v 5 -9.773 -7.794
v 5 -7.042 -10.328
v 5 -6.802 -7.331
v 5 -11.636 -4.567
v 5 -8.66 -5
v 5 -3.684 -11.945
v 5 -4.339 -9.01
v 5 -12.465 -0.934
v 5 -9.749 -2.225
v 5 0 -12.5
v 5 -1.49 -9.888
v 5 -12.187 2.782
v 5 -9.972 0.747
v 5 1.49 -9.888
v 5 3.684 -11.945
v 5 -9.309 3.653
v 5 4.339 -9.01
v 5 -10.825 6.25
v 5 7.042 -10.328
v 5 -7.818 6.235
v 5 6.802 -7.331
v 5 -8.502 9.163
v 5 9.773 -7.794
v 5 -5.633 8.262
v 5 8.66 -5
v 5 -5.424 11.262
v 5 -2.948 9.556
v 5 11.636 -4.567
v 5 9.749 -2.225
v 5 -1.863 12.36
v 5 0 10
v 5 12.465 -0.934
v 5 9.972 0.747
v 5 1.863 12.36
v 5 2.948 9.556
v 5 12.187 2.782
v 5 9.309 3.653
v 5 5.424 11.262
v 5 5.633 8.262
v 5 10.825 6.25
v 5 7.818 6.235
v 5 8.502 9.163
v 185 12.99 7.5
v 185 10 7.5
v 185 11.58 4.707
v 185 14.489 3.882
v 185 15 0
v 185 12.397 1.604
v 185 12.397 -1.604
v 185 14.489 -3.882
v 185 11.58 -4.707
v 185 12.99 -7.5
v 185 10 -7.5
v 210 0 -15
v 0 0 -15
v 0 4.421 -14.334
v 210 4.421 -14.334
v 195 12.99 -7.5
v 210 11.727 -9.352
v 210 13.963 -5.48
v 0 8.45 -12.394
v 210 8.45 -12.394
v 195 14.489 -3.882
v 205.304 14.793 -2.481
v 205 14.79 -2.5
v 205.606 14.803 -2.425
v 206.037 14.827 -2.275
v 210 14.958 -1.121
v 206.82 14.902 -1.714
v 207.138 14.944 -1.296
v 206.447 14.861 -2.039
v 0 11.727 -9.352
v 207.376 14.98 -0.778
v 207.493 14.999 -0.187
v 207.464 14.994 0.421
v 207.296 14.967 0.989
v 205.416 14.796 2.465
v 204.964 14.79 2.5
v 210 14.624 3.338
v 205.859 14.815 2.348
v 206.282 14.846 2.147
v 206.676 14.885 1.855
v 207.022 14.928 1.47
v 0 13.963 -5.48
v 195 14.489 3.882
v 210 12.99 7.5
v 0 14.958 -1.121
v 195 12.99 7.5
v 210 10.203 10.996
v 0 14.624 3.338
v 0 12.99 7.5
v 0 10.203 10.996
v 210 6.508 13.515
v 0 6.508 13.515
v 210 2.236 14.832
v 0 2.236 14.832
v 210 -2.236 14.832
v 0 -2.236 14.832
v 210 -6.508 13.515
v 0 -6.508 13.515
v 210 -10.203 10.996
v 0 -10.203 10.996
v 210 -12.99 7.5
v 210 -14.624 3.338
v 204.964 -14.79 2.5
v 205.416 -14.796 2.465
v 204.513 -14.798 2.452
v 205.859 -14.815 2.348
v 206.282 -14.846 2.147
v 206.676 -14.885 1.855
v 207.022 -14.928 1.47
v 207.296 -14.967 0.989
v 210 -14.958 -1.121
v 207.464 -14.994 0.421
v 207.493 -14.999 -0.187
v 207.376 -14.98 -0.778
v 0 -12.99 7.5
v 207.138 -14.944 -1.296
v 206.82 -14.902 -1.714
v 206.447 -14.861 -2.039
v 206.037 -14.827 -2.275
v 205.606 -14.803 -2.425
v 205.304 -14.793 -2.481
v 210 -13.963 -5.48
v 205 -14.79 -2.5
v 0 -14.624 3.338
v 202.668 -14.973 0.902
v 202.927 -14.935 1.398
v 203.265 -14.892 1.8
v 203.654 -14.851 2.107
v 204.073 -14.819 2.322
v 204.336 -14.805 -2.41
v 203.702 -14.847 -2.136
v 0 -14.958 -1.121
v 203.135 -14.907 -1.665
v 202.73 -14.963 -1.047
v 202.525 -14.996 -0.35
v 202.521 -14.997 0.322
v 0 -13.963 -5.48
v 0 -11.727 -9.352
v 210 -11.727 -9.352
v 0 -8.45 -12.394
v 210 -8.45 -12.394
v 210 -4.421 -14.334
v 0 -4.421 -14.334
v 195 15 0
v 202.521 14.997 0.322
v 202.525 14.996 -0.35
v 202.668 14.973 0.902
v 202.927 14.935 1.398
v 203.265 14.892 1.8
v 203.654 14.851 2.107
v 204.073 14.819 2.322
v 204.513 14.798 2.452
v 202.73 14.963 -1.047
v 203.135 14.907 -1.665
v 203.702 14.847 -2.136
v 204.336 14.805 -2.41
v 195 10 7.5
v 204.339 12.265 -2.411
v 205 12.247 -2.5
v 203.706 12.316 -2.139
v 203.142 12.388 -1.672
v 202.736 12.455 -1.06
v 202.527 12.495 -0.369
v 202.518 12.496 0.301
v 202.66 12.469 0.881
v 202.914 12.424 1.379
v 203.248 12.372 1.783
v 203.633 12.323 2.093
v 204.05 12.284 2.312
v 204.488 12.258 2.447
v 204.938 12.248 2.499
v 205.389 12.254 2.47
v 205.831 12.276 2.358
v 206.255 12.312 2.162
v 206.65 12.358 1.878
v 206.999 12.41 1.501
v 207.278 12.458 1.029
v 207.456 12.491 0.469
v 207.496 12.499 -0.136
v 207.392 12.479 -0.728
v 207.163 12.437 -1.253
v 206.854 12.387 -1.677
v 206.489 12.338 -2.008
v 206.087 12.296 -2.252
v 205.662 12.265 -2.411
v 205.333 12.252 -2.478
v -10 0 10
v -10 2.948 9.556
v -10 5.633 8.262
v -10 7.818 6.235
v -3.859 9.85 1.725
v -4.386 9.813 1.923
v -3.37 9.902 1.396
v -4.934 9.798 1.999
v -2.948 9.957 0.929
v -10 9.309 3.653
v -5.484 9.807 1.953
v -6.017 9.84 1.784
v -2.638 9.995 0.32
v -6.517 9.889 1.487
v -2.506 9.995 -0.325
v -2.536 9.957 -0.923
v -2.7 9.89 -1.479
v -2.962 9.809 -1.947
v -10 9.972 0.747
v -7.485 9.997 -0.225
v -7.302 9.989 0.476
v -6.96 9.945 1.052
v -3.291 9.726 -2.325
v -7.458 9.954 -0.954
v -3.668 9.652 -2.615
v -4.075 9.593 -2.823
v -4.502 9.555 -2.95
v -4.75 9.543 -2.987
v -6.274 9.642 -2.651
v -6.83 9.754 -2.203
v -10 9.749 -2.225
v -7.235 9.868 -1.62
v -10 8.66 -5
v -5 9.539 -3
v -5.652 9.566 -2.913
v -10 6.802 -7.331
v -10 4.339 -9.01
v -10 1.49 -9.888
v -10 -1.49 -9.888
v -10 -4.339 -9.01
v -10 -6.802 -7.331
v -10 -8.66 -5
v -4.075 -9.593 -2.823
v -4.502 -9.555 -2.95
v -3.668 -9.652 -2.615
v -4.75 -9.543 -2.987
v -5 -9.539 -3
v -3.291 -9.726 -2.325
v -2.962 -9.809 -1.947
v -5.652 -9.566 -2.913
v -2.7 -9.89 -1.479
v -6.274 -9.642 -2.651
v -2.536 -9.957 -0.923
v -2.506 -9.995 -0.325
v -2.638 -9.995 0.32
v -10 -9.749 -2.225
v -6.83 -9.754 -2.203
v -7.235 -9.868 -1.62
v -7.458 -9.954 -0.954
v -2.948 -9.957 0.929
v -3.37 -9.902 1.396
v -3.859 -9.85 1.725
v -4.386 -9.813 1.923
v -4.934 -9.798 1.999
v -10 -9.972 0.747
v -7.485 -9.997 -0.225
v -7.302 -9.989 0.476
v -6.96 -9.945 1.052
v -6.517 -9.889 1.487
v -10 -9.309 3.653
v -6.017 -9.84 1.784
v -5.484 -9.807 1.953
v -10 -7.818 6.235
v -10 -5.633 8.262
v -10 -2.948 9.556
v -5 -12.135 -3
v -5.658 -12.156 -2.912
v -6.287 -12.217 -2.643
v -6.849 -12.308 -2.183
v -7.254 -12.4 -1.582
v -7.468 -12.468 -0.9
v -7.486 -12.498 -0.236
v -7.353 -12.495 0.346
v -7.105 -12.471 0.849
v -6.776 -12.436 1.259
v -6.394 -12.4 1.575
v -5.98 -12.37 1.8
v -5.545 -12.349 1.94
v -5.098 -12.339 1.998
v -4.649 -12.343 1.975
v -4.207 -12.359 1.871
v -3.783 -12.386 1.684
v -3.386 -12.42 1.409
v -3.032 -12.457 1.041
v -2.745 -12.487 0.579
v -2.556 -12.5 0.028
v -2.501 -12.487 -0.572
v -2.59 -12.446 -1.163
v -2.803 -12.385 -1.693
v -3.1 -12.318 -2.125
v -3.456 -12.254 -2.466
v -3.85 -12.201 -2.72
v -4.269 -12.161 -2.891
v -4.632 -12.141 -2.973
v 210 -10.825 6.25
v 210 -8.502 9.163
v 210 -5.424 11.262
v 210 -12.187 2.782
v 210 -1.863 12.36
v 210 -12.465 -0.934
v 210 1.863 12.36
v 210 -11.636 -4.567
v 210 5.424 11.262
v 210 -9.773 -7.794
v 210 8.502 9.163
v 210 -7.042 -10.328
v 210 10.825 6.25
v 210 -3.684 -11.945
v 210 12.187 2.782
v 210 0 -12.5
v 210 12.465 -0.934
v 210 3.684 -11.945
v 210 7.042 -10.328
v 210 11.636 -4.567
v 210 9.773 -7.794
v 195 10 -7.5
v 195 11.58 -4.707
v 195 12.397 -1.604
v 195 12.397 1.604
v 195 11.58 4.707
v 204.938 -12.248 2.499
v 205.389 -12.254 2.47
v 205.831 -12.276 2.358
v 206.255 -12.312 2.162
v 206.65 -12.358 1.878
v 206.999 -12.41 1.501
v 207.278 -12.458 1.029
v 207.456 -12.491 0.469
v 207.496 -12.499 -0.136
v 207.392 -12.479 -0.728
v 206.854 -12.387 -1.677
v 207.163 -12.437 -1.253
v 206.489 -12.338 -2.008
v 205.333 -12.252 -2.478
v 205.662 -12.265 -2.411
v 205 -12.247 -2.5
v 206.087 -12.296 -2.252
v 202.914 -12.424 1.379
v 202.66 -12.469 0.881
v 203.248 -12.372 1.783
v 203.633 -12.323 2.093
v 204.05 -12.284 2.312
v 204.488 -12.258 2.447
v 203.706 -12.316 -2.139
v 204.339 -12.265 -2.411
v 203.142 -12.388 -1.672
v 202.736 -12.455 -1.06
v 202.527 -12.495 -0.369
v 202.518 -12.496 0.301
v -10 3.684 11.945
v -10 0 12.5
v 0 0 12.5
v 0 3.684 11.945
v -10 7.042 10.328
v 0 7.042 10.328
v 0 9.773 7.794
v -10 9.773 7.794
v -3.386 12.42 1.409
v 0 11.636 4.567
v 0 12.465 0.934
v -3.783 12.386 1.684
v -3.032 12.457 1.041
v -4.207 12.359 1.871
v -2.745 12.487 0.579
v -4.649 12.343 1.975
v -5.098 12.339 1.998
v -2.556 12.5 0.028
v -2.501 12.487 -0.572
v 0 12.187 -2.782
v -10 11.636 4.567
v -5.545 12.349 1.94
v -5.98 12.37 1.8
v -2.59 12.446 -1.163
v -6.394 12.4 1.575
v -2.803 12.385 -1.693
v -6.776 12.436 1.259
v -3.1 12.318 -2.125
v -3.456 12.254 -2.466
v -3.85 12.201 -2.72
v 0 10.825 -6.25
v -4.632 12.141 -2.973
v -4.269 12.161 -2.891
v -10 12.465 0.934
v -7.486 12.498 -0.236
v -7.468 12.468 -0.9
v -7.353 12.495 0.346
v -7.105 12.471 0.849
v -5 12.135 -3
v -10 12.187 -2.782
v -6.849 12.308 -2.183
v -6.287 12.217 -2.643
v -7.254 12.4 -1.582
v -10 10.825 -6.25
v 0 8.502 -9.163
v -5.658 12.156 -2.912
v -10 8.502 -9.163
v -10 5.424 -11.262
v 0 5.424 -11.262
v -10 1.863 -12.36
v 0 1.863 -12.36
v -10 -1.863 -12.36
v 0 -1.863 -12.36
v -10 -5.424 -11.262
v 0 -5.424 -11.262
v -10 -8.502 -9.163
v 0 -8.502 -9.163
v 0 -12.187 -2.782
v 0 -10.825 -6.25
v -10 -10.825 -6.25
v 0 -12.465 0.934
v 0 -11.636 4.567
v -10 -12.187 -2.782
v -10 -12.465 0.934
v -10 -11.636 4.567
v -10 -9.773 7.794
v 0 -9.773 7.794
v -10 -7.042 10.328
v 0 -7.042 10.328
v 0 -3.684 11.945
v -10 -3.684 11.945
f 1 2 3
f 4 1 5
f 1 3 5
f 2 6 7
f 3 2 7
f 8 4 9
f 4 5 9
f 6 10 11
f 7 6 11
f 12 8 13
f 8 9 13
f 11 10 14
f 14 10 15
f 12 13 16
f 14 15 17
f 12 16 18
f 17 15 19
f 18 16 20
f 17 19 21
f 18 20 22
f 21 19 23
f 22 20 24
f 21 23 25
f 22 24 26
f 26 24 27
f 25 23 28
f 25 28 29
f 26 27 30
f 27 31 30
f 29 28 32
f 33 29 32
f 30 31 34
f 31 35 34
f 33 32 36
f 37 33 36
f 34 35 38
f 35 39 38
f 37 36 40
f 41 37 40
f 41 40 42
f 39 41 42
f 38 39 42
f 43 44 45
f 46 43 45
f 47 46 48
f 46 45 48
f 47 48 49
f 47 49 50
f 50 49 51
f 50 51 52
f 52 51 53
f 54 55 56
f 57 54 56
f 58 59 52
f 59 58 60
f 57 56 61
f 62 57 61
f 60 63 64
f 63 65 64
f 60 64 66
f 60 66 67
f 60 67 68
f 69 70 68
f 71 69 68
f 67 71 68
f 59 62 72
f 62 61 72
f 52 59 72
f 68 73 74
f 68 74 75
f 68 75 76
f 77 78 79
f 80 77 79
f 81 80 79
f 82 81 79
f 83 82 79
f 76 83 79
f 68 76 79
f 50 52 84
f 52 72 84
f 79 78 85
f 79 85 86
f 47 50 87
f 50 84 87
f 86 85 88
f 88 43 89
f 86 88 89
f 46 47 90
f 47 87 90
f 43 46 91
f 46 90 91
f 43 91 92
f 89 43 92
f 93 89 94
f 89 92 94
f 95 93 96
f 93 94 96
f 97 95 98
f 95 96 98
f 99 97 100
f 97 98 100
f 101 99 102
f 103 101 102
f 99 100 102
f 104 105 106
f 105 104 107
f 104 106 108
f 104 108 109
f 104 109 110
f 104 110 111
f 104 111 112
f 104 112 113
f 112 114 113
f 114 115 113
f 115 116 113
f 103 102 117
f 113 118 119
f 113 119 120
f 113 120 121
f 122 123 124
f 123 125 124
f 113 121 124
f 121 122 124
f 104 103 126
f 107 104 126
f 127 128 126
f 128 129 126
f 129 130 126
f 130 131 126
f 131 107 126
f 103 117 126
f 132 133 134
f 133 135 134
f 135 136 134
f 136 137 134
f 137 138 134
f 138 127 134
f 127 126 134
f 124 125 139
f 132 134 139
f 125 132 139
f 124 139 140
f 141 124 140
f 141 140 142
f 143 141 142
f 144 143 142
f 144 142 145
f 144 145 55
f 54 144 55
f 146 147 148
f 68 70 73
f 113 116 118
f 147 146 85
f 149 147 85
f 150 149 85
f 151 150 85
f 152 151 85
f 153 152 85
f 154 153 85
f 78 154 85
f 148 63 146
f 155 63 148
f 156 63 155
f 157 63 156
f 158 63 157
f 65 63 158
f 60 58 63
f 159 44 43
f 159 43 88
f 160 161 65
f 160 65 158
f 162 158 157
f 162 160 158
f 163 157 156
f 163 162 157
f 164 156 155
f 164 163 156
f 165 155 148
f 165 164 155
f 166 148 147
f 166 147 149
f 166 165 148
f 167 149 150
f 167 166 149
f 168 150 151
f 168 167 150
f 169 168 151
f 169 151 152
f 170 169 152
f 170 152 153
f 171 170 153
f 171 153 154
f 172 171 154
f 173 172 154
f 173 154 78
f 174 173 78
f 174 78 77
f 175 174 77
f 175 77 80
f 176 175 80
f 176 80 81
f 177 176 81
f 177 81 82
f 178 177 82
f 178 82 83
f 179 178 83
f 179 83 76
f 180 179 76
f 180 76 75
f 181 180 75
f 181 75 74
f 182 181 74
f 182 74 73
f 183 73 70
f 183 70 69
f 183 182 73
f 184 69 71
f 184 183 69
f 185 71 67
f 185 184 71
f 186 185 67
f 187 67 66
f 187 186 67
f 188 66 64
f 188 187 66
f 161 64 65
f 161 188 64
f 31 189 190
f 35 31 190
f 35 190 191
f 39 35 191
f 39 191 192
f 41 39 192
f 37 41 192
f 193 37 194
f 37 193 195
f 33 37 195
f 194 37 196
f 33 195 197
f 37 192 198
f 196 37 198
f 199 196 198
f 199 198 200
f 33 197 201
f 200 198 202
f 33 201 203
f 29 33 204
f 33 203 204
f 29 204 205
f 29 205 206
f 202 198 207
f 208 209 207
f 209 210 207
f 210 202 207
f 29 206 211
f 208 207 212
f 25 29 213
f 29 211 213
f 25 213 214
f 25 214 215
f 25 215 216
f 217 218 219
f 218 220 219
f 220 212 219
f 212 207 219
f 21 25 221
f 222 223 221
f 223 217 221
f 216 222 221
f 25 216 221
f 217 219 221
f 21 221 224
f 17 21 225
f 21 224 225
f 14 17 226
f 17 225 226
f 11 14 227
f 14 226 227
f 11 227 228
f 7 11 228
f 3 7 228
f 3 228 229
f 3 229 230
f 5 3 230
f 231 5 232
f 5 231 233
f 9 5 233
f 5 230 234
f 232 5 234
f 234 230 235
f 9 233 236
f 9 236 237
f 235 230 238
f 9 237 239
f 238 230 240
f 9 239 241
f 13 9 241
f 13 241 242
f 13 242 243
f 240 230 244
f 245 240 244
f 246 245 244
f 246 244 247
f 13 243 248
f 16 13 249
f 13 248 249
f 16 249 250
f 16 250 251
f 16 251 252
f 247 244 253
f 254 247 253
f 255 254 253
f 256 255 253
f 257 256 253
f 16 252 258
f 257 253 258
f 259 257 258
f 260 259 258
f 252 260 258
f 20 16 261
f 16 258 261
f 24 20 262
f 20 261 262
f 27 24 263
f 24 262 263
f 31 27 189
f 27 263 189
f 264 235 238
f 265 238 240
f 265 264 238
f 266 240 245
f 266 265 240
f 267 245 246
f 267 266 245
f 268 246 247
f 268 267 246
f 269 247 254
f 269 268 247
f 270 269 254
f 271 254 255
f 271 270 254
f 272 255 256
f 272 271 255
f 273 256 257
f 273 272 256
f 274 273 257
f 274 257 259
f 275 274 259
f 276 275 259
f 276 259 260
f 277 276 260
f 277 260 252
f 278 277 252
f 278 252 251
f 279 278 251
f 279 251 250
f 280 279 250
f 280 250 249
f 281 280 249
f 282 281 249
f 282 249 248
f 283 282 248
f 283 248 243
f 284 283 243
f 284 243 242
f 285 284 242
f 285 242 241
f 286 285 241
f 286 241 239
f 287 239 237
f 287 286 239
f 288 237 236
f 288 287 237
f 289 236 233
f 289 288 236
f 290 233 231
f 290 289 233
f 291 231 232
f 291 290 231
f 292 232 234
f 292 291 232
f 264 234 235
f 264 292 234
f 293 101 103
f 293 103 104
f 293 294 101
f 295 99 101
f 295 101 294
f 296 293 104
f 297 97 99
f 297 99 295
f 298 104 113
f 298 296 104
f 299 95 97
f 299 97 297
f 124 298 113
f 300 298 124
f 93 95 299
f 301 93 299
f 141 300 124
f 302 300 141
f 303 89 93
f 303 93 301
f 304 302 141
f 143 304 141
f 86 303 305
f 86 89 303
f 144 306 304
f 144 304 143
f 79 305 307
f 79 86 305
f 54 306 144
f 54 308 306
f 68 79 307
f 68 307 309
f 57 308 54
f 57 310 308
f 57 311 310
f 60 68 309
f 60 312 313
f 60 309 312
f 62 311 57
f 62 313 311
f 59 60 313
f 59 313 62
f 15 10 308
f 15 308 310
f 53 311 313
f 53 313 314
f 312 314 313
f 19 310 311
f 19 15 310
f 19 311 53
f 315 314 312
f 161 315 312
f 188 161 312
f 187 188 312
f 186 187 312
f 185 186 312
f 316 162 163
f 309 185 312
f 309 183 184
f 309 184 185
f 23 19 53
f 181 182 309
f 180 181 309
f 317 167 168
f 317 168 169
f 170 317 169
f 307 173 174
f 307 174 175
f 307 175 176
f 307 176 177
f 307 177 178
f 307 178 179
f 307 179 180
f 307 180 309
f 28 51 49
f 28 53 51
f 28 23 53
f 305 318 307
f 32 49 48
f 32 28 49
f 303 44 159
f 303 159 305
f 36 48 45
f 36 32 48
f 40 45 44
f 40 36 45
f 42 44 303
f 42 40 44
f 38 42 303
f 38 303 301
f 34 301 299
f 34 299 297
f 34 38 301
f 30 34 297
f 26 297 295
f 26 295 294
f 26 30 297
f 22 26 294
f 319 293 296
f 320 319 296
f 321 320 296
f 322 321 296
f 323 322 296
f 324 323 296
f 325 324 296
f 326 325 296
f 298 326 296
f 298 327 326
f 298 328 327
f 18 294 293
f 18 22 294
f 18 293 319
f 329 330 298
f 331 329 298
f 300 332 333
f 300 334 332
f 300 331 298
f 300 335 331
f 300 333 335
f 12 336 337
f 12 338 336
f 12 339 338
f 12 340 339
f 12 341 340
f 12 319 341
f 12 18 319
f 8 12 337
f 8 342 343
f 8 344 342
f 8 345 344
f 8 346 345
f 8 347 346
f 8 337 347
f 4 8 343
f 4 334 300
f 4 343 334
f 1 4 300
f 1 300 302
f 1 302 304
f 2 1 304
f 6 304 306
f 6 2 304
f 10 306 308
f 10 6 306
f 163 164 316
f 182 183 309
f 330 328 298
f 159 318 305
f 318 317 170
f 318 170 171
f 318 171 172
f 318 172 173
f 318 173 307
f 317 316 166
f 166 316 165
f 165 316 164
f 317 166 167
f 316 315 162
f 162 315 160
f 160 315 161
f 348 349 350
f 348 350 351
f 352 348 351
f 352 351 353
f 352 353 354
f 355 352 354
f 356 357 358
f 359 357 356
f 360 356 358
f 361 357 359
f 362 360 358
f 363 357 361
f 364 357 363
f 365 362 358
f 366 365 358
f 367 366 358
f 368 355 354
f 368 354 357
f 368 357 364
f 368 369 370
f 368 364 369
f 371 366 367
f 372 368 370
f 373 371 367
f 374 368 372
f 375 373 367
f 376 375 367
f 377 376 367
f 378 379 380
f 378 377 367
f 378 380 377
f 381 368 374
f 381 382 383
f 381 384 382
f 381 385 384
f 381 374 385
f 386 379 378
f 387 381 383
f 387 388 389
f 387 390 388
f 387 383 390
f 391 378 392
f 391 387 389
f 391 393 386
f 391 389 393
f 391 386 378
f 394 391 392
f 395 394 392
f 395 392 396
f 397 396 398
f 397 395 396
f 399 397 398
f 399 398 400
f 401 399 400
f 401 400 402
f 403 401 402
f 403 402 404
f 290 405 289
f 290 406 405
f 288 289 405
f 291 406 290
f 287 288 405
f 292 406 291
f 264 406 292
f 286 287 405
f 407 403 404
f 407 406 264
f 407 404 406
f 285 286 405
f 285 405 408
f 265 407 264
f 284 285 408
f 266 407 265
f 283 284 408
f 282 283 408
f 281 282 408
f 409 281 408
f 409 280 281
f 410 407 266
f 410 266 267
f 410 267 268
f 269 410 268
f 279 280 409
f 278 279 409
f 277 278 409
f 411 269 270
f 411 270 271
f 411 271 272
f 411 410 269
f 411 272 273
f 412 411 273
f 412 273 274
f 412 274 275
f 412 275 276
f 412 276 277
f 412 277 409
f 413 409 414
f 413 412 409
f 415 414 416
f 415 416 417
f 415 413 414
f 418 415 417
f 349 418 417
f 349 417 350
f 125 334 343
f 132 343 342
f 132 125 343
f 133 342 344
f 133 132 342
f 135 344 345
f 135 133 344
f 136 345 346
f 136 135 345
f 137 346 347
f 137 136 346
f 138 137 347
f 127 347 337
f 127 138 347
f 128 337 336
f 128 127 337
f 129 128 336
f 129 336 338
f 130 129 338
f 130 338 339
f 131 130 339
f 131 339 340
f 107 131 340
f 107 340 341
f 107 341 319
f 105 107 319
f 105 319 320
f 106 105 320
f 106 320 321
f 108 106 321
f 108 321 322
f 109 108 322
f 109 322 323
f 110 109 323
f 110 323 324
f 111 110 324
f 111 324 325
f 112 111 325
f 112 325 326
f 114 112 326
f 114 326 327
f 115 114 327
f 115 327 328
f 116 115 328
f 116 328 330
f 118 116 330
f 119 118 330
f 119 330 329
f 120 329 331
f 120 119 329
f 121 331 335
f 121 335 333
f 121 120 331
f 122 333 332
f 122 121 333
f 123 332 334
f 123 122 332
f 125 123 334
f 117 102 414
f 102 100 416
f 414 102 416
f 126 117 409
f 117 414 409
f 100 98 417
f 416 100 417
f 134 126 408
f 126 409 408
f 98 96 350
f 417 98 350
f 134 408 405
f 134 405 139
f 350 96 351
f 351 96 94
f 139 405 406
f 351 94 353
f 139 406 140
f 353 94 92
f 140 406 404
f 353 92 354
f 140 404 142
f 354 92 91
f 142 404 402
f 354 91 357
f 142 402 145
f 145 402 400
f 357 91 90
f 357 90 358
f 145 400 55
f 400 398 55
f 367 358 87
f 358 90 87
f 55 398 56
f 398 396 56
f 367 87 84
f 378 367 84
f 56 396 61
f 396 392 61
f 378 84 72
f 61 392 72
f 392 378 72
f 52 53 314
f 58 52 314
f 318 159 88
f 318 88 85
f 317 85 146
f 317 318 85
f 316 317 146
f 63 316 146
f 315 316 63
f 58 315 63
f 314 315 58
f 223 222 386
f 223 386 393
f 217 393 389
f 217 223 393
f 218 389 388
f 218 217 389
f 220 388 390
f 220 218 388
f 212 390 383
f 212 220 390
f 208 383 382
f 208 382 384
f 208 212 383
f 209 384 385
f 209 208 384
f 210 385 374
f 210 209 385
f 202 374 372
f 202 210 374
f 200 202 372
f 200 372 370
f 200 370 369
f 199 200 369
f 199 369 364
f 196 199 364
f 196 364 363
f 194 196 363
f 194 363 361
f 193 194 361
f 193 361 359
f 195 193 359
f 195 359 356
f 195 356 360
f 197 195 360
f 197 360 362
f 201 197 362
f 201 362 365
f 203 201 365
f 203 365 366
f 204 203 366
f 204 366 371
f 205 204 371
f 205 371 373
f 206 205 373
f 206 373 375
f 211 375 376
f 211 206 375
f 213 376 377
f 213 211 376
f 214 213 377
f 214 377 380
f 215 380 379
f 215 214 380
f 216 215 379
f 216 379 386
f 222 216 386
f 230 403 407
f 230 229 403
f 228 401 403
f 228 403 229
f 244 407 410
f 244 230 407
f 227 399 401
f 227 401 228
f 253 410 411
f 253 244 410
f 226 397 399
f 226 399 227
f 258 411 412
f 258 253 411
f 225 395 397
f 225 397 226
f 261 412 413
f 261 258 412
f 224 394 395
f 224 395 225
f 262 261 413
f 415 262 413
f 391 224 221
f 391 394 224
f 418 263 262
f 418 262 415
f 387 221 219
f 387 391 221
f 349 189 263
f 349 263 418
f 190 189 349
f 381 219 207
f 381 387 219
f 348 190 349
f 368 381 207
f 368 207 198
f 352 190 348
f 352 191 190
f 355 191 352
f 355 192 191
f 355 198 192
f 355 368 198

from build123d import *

# Parameters (mm, degrees)
ESBO_O1_R                  = 15
ESBO_O1_R_2                = 12.5
RESSALTO_EXTRUS_O1_DEPTH   = 210
RESSALTO_EXTRUS_O3_START   = 10
ESBO_O2_R                  = 12.5
ESBO_O2_R_2                = 10
RESSALTO_EXTRUS_O3_DEPTH   = 15
CORTE_EXTRUS_O2_DEPTH      = 300
CORTE_EXTRUS_O2_DEPTH_BACK = 300
ESBO_O4_R                  = 2.5
CORTE_EXTRUS_O3_DEPTH      = 300
CORTE_EXTRUS_O3_DEPTH_BACK = 300
ESBO_O4_3_R                = 2.5
ESBO_O6_W                  = 10
ESBO_O6_H                  = 15
CORTE_EXTRUS_O4_DEPTH      = 20


with BuildPart() as part:
    # Esboço1 → Ressalto-extrusão1 (new body)
    with BuildSketch(Plane(origin=(0, 0, 0), x_dir=(0, 0, -1), z_dir=(1, 0, 0))):
        Circle(ESBO_O1_R)
        Circle(ESBO_O1_R_2, mode=Mode.SUBTRACT)
    extrude(amount=RESSALTO_EXTRUS_O1_DEPTH)

    # Esboço2 → Ressalto-extrusão3 (add)
    with BuildSketch(Plane.ZY.offset(RESSALTO_EXTRUS_O3_START)):
        Circle(ESBO_O2_R)
        Circle(ESBO_O2_R_2, mode=Mode.SUBTRACT)
    extrude(amount=-RESSALTO_EXTRUS_O3_DEPTH)

    # Esboço4 → Corte-extrusão2 (cut, two sides: drawn at the far end of the back side and taken through both)
    with BuildSketch(Plane(origin=(0, 0, 0), x_dir=(1, 0, 0), z_dir=(0, 1, 0)).offset(-CORTE_EXTRUS_O2_DEPTH_BACK)):
        with Locations((205, 0)):
            Circle(ESBO_O4_R)
    extrude(amount=CORTE_EXTRUS_O2_DEPTH + CORTE_EXTRUS_O2_DEPTH_BACK, mode=Mode.SUBTRACT)

    # Esboço4<3> → Corte-extrusão3 (cut, two sides: drawn at the far end of the back side and taken through both)
    with BuildSketch(Plane(origin=(0, 0, 0), x_dir=(1, 0, 0), z_dir=(0, 1, 0)).offset(-CORTE_EXTRUS_O3_DEPTH_BACK)):
        with Locations((-5, 0.5)):
            Circle(ESBO_O4_3_R)
        with Locations((205, 0)):
            Circle(ESBO_O4_3_R)
    extrude(amount=CORTE_EXTRUS_O3_DEPTH + CORTE_EXTRUS_O3_DEPTH_BACK, mode=Mode.SUBTRACT)

    # Esboço6 → Corte-extrusão4 (cut)
    with BuildSketch(Plane(origin=(0, 0, 0), x_dir=(1, 0, 0), z_dir=(0, 1, 0))):
        with Locations((190, 0)):
            Rectangle(ESBO_O6_W, ESBO_O6_H)
    extrude(amount=CORTE_EXTRUS_O4_DEPTH, mode=Mode.SUBTRACT)


solid = part.part
